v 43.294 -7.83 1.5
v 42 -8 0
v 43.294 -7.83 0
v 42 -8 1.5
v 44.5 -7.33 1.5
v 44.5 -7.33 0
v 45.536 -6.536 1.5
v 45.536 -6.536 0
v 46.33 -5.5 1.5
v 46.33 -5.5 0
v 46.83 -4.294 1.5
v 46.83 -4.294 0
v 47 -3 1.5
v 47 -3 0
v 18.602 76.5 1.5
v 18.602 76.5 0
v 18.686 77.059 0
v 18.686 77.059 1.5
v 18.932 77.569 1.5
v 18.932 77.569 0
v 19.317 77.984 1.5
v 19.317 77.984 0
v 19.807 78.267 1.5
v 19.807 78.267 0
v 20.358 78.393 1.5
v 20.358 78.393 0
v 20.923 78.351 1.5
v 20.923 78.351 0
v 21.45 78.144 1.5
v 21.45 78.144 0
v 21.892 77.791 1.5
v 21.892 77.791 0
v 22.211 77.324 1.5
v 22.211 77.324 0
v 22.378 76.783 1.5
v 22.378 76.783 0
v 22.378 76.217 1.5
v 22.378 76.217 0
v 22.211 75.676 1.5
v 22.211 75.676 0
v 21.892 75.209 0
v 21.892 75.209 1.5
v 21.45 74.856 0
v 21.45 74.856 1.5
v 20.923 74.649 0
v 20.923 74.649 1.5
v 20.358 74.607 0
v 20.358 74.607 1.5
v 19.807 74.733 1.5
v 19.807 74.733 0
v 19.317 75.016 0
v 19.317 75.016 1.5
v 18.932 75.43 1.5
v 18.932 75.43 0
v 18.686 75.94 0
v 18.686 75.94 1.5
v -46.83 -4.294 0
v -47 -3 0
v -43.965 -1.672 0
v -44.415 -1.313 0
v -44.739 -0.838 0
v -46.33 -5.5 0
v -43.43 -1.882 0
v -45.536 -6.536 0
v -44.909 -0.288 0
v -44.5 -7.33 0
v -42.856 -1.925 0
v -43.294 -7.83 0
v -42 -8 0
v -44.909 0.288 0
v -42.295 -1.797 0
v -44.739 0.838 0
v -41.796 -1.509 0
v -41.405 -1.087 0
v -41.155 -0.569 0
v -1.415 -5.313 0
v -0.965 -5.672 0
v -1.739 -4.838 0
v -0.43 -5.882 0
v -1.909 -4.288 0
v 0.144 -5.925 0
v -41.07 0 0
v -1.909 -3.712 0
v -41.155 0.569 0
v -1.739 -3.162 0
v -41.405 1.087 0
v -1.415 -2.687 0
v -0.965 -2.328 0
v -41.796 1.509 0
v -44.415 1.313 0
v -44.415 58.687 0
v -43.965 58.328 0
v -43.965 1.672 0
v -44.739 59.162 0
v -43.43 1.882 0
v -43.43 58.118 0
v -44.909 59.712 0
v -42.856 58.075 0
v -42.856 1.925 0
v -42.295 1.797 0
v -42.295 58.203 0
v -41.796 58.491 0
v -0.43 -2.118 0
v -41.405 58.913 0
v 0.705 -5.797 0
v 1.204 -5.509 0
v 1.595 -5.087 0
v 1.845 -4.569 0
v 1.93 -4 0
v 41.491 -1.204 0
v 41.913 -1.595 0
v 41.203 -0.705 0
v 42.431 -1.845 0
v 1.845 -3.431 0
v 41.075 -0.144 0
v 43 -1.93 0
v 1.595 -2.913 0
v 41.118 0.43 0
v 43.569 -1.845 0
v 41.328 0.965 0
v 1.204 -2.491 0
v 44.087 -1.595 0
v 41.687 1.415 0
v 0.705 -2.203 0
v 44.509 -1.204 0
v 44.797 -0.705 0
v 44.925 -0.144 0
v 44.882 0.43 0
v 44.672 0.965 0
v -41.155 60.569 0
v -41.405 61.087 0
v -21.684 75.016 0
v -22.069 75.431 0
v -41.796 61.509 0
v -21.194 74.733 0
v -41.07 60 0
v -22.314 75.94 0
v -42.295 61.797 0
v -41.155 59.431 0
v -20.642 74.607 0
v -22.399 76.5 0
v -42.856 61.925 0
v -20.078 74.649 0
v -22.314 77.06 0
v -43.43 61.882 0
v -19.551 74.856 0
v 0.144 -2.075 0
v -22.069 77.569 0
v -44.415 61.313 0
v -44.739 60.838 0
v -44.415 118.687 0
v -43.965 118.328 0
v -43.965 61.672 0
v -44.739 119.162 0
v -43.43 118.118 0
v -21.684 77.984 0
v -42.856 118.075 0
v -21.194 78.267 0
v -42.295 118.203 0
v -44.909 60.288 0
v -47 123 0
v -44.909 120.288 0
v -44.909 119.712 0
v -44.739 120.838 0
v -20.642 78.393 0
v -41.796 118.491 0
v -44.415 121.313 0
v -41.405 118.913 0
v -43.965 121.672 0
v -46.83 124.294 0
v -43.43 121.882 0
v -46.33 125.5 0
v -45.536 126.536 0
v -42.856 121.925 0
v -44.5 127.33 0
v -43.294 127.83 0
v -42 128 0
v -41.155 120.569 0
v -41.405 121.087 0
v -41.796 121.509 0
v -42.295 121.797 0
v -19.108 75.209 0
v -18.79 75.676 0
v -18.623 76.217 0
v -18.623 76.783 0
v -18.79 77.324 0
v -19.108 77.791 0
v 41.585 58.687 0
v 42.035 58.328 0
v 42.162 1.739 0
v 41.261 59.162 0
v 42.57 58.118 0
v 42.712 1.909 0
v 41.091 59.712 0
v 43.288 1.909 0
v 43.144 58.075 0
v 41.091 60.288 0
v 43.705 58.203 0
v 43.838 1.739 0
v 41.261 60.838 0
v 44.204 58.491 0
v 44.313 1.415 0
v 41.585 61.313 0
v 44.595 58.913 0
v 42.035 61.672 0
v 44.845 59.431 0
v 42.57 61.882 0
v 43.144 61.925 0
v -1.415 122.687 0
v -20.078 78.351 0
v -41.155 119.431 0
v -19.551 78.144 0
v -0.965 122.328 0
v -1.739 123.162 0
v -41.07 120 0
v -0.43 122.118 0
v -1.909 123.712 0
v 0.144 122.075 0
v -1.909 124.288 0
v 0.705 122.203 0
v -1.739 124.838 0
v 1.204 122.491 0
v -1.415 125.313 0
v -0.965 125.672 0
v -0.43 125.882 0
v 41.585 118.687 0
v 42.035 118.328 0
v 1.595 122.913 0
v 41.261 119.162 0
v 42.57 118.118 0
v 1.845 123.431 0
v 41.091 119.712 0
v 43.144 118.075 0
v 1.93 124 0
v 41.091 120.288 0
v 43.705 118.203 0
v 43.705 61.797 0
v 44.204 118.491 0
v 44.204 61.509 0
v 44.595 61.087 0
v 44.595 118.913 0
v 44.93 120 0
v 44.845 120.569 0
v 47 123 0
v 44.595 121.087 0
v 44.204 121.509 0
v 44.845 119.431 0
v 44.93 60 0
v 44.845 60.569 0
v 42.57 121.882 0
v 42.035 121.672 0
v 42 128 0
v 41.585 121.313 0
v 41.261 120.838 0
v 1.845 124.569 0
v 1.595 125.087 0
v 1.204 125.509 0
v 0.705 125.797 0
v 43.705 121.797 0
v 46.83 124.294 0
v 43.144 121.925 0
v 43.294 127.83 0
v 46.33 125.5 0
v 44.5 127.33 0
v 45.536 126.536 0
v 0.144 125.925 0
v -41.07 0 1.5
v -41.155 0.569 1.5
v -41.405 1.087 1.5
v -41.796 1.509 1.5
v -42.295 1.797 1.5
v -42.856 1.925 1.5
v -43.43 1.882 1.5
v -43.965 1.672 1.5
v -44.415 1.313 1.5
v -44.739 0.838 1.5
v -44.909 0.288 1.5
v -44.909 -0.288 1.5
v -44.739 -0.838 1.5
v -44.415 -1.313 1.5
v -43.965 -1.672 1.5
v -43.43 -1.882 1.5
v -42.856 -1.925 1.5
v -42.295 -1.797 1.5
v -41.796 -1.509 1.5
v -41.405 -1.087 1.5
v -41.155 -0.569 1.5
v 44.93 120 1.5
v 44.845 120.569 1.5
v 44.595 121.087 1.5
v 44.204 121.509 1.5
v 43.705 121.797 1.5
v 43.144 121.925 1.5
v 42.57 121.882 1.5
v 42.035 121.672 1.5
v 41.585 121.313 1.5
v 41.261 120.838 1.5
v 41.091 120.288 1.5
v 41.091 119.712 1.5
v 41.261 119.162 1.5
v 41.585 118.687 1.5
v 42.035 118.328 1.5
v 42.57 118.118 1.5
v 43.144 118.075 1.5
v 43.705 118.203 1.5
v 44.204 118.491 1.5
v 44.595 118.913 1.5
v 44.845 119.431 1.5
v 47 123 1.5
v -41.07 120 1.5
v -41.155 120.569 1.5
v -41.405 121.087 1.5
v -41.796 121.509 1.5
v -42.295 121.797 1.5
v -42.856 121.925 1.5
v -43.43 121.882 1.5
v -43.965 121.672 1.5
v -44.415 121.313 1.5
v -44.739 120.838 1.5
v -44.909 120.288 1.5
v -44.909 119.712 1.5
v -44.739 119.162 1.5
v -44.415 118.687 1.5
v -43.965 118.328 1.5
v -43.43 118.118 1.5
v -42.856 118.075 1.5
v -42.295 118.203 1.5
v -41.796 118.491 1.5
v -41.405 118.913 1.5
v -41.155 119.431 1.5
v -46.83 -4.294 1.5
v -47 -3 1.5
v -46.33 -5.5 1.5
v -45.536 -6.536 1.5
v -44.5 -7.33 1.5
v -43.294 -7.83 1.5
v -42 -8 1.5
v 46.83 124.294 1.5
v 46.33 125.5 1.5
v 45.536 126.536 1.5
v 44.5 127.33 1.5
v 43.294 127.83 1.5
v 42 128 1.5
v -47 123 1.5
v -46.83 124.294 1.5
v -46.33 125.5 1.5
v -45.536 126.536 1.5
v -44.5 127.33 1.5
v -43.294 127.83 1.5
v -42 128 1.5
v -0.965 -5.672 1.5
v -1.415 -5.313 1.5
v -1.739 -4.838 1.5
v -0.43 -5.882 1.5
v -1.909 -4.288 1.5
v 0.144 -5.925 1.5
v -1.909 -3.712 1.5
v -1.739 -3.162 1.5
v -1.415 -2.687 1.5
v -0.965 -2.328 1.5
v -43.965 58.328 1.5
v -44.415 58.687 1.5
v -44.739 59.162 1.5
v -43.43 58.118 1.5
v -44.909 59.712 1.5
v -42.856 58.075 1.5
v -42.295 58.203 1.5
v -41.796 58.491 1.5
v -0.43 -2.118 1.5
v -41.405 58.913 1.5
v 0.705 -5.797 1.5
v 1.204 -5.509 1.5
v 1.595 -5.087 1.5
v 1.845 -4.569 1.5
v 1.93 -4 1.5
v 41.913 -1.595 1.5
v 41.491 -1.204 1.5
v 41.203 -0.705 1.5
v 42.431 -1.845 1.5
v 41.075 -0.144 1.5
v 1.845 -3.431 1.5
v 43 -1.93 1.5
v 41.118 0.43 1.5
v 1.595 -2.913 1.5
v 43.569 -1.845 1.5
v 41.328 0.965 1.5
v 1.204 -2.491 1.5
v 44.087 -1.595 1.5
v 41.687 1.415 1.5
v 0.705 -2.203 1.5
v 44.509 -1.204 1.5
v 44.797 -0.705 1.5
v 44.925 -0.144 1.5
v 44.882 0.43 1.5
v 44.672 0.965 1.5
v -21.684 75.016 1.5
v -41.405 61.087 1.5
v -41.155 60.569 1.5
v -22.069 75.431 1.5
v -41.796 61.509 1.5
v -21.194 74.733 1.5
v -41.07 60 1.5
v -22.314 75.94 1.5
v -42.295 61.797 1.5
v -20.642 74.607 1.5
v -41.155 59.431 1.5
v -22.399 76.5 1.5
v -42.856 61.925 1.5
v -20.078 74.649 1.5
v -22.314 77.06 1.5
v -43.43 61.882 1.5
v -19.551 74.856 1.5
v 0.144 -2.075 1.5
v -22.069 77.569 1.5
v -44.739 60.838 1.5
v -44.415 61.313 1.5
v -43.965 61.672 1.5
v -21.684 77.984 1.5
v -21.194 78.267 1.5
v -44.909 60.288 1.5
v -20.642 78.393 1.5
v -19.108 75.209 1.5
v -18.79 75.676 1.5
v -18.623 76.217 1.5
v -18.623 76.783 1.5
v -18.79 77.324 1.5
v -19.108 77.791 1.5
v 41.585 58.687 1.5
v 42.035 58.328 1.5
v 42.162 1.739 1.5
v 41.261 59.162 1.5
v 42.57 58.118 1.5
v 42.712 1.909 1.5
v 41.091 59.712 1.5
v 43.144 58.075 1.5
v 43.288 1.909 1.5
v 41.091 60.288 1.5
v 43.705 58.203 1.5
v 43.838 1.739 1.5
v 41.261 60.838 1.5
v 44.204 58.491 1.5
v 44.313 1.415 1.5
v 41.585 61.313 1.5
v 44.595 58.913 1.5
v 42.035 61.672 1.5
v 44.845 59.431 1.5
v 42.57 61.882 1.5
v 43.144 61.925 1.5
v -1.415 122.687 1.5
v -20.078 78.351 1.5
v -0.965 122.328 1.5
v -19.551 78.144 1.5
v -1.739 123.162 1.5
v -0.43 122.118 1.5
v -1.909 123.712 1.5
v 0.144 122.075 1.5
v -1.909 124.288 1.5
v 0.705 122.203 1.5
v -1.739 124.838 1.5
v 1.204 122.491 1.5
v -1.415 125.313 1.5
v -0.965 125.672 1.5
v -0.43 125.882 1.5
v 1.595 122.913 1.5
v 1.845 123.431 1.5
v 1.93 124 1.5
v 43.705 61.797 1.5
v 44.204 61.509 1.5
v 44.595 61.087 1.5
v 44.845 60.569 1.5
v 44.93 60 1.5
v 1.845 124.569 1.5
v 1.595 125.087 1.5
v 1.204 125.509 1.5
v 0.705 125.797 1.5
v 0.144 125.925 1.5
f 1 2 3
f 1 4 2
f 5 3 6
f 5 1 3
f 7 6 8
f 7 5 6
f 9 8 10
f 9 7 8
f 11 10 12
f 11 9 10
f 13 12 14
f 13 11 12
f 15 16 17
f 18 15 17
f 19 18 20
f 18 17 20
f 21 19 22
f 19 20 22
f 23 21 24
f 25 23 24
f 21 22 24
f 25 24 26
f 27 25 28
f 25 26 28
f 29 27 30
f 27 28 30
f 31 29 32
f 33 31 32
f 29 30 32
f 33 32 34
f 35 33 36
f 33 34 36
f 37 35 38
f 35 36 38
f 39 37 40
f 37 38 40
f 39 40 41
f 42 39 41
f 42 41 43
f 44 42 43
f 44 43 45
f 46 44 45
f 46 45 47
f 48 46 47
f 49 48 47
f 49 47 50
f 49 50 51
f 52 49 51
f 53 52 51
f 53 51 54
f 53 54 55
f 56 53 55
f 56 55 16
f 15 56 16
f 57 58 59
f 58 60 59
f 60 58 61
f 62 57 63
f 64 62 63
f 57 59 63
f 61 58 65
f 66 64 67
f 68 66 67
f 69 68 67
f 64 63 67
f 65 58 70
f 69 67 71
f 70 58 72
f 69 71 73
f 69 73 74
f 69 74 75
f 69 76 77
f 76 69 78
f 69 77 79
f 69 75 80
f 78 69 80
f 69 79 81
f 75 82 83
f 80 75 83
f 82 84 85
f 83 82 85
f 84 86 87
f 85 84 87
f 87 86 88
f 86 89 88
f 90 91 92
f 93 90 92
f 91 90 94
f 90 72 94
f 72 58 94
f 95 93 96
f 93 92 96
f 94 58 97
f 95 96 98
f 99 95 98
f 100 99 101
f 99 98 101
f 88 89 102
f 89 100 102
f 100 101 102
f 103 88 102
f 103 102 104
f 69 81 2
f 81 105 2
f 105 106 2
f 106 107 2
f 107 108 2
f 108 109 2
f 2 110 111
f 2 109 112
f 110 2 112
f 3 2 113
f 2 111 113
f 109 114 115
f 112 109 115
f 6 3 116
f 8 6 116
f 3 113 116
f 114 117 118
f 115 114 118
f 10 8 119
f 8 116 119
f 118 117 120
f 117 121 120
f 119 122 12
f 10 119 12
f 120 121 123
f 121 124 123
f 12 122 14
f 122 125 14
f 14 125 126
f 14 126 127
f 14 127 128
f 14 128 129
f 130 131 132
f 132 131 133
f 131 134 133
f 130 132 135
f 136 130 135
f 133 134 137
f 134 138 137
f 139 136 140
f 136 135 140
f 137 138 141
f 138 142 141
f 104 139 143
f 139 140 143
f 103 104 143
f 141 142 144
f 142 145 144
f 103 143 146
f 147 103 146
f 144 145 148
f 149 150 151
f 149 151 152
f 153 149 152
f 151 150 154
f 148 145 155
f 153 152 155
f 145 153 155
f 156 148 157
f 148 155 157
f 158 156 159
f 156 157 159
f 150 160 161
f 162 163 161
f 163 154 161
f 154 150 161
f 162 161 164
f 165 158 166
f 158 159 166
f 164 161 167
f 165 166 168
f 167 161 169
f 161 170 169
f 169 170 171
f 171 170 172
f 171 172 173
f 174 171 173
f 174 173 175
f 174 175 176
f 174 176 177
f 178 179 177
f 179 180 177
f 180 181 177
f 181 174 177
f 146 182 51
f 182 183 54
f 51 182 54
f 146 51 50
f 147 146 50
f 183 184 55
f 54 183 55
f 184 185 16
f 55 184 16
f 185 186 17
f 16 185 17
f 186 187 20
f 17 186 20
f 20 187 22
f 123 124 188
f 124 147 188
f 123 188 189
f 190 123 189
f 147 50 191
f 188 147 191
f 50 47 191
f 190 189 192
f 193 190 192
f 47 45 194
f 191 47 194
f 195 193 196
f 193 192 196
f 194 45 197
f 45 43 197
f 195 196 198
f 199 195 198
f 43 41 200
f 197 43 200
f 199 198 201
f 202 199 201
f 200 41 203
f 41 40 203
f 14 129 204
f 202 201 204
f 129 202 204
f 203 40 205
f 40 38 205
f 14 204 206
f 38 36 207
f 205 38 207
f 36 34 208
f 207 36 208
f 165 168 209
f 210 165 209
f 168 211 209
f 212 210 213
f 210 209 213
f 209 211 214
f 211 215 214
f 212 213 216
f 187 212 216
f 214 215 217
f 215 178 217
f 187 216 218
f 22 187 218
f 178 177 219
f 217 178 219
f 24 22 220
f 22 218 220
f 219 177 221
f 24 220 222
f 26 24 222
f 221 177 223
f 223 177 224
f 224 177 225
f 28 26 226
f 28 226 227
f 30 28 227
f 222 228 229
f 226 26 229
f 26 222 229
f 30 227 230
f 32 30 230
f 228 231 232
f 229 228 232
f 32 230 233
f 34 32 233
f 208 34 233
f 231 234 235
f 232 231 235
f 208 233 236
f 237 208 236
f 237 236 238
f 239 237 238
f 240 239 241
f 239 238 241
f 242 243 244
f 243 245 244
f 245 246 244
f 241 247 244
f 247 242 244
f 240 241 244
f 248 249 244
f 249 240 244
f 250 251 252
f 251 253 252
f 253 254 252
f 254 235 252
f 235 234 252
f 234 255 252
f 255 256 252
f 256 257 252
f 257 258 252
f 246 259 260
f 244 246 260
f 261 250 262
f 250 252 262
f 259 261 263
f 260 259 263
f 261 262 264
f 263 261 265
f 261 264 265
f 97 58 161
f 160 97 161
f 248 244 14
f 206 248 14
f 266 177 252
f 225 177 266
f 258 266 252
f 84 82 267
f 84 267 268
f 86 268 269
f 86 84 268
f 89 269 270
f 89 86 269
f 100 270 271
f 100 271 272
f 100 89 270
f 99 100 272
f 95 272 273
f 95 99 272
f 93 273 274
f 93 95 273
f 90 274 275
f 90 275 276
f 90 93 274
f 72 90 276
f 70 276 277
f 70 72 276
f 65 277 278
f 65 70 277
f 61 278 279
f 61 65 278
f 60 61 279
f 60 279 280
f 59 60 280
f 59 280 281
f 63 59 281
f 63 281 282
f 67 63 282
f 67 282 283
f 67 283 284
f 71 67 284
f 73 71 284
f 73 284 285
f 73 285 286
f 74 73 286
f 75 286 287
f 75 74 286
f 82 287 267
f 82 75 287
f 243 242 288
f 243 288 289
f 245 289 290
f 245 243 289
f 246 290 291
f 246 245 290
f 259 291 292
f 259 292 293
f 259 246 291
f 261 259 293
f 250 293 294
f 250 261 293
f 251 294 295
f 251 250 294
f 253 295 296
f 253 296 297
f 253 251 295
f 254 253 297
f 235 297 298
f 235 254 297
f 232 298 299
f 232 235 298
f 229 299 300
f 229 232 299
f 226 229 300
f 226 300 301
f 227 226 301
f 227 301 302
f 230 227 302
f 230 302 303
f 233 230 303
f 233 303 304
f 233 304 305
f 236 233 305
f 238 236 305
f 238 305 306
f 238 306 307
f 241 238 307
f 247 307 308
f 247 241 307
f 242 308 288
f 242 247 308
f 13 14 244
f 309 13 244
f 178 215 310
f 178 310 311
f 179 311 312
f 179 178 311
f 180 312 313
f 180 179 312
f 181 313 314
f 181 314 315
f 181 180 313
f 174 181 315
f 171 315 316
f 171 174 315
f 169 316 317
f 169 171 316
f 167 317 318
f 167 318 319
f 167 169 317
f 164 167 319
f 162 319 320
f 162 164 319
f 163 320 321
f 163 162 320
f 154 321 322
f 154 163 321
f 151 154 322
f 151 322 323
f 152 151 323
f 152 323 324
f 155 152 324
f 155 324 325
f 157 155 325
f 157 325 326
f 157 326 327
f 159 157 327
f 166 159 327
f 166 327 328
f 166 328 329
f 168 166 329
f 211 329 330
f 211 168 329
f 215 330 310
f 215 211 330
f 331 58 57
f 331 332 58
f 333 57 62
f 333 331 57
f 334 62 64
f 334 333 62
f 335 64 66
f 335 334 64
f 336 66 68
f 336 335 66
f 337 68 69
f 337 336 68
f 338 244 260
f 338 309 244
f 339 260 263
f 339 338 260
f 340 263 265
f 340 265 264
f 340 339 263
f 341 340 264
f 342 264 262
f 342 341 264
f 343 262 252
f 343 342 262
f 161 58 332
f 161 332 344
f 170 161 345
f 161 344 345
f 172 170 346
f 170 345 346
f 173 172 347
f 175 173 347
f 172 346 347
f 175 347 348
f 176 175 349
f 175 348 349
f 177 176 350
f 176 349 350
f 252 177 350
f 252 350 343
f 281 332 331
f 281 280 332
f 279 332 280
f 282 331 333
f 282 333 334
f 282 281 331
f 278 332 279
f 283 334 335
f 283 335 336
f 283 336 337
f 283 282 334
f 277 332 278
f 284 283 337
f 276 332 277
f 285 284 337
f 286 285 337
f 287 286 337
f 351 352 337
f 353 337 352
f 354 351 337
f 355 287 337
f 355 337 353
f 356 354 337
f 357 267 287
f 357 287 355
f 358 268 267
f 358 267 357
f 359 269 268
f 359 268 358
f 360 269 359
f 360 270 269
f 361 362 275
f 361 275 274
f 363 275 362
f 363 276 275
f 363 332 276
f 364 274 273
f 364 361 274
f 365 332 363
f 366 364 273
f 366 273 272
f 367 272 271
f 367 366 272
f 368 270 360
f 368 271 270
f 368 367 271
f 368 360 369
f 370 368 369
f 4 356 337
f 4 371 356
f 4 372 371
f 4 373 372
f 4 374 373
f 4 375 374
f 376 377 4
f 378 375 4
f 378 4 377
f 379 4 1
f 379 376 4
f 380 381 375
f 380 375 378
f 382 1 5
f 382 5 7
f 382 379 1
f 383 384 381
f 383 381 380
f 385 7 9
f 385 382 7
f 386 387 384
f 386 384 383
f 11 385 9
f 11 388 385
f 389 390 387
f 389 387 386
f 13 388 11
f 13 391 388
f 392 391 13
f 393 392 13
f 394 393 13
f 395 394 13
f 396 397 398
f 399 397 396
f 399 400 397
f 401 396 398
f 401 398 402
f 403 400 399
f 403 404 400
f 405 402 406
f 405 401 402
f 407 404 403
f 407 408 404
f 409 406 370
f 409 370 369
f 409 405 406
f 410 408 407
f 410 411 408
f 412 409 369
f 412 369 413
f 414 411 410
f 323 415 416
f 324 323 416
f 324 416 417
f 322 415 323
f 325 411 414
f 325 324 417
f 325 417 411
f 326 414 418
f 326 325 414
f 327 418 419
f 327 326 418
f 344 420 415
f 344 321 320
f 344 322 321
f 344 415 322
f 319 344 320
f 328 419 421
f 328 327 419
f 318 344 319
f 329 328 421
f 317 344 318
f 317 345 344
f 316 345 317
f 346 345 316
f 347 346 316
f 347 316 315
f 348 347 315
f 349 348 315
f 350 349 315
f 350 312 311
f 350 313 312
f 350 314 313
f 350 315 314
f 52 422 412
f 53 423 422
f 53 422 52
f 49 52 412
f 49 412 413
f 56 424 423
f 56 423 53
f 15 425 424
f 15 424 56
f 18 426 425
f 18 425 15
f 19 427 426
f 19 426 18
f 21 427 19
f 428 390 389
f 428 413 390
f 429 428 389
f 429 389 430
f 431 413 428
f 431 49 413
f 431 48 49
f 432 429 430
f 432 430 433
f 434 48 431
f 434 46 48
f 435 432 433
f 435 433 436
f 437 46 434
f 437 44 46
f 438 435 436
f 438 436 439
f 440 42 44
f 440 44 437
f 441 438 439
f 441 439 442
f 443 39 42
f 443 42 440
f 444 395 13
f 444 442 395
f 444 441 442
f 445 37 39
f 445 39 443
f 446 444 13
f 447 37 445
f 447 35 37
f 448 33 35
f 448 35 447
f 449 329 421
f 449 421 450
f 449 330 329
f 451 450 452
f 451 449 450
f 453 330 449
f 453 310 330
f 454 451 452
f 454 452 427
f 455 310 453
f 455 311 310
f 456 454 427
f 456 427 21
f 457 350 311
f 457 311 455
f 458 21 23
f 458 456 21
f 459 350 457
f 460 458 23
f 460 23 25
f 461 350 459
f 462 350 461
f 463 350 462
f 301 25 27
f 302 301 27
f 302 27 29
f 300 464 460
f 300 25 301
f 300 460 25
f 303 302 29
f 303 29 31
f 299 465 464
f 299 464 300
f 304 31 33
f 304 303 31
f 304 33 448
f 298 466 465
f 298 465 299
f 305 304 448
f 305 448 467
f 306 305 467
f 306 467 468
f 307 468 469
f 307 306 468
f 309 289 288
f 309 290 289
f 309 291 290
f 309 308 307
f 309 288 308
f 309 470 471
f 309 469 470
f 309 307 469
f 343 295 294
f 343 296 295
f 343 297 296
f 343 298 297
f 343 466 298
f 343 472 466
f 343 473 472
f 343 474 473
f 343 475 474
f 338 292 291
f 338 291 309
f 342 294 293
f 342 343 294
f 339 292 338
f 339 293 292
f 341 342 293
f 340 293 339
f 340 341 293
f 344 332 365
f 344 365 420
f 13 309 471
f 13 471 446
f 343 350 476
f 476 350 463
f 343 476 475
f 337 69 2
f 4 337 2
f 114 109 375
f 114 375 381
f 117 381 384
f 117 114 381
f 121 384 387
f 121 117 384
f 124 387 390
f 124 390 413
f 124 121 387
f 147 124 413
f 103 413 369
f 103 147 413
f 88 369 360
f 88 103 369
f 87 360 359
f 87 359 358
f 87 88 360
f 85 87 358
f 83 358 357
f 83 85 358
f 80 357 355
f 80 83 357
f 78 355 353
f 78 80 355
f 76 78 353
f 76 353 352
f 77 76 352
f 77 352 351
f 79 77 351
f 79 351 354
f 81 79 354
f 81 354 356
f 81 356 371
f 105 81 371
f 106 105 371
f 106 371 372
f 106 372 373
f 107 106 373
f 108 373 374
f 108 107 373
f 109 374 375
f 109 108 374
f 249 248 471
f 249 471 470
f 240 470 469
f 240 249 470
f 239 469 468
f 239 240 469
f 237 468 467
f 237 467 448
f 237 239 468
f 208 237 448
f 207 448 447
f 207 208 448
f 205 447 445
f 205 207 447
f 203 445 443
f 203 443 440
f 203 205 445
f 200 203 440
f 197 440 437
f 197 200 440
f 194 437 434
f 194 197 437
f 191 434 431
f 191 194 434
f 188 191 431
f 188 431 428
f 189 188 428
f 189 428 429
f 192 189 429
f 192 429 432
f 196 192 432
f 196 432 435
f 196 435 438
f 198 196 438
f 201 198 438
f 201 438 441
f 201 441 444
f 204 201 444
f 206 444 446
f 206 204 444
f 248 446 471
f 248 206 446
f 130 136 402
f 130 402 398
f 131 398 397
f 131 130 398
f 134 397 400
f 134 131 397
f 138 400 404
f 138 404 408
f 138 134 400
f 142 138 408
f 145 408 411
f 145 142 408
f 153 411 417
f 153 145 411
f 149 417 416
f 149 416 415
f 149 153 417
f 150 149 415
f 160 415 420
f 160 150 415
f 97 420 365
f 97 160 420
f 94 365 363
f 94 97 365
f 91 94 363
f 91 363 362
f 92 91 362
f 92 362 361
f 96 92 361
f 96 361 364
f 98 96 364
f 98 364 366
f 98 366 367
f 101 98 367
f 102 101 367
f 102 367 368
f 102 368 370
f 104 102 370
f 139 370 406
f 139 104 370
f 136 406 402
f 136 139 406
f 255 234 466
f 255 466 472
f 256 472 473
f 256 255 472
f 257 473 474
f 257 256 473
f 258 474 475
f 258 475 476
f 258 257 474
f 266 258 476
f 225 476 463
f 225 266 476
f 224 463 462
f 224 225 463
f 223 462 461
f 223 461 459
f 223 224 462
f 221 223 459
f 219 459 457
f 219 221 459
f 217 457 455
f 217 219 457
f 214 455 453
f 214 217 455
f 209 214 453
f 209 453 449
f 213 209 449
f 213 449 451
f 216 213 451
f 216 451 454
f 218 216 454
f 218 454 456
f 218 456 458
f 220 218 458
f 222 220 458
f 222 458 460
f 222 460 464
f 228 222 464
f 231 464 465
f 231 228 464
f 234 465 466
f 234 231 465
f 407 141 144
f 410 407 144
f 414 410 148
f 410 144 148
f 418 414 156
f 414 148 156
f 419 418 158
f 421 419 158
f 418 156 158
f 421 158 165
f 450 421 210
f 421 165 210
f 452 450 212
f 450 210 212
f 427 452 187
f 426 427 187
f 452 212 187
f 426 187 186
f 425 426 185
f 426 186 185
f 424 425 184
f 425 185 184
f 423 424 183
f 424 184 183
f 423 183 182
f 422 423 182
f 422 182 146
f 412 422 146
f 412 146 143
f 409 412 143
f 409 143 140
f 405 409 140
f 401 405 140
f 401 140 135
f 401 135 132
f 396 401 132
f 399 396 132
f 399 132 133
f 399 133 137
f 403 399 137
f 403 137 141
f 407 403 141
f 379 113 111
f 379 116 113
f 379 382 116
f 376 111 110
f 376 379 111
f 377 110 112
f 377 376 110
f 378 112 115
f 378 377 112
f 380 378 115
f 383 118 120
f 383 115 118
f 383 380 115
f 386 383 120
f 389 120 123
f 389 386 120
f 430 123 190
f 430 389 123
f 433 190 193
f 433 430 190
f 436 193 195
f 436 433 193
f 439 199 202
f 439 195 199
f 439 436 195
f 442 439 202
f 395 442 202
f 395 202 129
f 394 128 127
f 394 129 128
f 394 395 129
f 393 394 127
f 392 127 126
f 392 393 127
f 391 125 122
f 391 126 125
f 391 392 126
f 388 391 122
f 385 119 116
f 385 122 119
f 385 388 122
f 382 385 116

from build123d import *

# Parameters (mm, degrees)
SKETCH1_W                 = 94
SKETCH1_H                 = 136
BOSS_EXTRUDE1_DEPTH       = 1.5
FILLET1_R                 = 5
SKETCH_PATTERN1_OUTLINE_R = 1.9304
SKETCH_PATTERN1_DEPTH     = 1.5
SKETCH4_R                 = 1.8985
CUT_EXTRUDE1_DEPTH        = 137.364401513


# Read off the part's stored shape, not the designer's step: Sketch-Pattern1
with BuildPart() as part:
    # Sketch1 → Boss-Extrude1 (new body)
    with BuildSketch(Plane.XY):
        with Locations((0, 60)):
            Rectangle(SKETCH1_W, SKETCH1_H)
    extrude(amount=BOSS_EXTRUDE1_DEPTH)

    # Fillet1
    fillet1_edges = [part.edges().sort_by_distance(p)[0] for p in [
        (47, -8, 0.75),
        (-47, -8, 0.75),
        (-47, 128, 0.75),
        (47, 128, 0.75),
    ]]
    fillet(fillet1_edges, radius=FILLET1_R)

    # Sketch3 → #24 (0.152) Diameter Hole1 (revolve, cut)
    with BuildSketch(Plane(origin=(43, 0, 1.5), x_dir=(0, -1, 0), z_dir=(1, 0, 0))):
        Polygon((0, 0), (0, 13.859901339), (1.9304, 12.7), (1.9304, 0), align=None)
    revolve(axis=Axis((43, 0, 7.85), (0, 0, -1)), mode=Mode.SUBTRACT)

    # Sketch-Pattern1 outline → Sketch-Pattern1 (cut)
    with BuildSketch(Plane.XY):
        with Locations((0, -4)):
            Circle(SKETCH_PATTERN1_OUTLINE_R)
        with Locations((0, 124)):
            Circle(SKETCH_PATTERN1_OUTLINE_R)
        with Locations((43, 120)):
            Circle(SKETCH_PATTERN1_OUTLINE_R)
        with Locations((43, 60)):
            Circle(SKETCH_PATTERN1_OUTLINE_R)
        with Locations((-43, 120)):
            Circle(SKETCH_PATTERN1_OUTLINE_R)
        with Locations((-43, 60)):
            Circle(SKETCH_PATTERN1_OUTLINE_R)
        with Locations((-43, 0)):
            Circle(SKETCH_PATTERN1_OUTLINE_R)
    extrude(amount=SKETCH_PATTERN1_DEPTH, mode=Mode.SUBTRACT)

    # Sketch4 → Cut-Extrude1 (cut, through all)
    with BuildSketch(Plane(origin=(0, 0, 0), x_dir=(-1, 0, 0), z_dir=(0, 0, -1))):
        with Locations((20.500102944, 76.500016768)):
            Circle(SKETCH4_R)
        with Locations((-20.500312859, 76.499889767)):
            Circle(SKETCH4_R)
    extrude(amount=-CUT_EXTRUDE1_DEPTH, mode=Mode.SUBTRACT)


solid = part.part
